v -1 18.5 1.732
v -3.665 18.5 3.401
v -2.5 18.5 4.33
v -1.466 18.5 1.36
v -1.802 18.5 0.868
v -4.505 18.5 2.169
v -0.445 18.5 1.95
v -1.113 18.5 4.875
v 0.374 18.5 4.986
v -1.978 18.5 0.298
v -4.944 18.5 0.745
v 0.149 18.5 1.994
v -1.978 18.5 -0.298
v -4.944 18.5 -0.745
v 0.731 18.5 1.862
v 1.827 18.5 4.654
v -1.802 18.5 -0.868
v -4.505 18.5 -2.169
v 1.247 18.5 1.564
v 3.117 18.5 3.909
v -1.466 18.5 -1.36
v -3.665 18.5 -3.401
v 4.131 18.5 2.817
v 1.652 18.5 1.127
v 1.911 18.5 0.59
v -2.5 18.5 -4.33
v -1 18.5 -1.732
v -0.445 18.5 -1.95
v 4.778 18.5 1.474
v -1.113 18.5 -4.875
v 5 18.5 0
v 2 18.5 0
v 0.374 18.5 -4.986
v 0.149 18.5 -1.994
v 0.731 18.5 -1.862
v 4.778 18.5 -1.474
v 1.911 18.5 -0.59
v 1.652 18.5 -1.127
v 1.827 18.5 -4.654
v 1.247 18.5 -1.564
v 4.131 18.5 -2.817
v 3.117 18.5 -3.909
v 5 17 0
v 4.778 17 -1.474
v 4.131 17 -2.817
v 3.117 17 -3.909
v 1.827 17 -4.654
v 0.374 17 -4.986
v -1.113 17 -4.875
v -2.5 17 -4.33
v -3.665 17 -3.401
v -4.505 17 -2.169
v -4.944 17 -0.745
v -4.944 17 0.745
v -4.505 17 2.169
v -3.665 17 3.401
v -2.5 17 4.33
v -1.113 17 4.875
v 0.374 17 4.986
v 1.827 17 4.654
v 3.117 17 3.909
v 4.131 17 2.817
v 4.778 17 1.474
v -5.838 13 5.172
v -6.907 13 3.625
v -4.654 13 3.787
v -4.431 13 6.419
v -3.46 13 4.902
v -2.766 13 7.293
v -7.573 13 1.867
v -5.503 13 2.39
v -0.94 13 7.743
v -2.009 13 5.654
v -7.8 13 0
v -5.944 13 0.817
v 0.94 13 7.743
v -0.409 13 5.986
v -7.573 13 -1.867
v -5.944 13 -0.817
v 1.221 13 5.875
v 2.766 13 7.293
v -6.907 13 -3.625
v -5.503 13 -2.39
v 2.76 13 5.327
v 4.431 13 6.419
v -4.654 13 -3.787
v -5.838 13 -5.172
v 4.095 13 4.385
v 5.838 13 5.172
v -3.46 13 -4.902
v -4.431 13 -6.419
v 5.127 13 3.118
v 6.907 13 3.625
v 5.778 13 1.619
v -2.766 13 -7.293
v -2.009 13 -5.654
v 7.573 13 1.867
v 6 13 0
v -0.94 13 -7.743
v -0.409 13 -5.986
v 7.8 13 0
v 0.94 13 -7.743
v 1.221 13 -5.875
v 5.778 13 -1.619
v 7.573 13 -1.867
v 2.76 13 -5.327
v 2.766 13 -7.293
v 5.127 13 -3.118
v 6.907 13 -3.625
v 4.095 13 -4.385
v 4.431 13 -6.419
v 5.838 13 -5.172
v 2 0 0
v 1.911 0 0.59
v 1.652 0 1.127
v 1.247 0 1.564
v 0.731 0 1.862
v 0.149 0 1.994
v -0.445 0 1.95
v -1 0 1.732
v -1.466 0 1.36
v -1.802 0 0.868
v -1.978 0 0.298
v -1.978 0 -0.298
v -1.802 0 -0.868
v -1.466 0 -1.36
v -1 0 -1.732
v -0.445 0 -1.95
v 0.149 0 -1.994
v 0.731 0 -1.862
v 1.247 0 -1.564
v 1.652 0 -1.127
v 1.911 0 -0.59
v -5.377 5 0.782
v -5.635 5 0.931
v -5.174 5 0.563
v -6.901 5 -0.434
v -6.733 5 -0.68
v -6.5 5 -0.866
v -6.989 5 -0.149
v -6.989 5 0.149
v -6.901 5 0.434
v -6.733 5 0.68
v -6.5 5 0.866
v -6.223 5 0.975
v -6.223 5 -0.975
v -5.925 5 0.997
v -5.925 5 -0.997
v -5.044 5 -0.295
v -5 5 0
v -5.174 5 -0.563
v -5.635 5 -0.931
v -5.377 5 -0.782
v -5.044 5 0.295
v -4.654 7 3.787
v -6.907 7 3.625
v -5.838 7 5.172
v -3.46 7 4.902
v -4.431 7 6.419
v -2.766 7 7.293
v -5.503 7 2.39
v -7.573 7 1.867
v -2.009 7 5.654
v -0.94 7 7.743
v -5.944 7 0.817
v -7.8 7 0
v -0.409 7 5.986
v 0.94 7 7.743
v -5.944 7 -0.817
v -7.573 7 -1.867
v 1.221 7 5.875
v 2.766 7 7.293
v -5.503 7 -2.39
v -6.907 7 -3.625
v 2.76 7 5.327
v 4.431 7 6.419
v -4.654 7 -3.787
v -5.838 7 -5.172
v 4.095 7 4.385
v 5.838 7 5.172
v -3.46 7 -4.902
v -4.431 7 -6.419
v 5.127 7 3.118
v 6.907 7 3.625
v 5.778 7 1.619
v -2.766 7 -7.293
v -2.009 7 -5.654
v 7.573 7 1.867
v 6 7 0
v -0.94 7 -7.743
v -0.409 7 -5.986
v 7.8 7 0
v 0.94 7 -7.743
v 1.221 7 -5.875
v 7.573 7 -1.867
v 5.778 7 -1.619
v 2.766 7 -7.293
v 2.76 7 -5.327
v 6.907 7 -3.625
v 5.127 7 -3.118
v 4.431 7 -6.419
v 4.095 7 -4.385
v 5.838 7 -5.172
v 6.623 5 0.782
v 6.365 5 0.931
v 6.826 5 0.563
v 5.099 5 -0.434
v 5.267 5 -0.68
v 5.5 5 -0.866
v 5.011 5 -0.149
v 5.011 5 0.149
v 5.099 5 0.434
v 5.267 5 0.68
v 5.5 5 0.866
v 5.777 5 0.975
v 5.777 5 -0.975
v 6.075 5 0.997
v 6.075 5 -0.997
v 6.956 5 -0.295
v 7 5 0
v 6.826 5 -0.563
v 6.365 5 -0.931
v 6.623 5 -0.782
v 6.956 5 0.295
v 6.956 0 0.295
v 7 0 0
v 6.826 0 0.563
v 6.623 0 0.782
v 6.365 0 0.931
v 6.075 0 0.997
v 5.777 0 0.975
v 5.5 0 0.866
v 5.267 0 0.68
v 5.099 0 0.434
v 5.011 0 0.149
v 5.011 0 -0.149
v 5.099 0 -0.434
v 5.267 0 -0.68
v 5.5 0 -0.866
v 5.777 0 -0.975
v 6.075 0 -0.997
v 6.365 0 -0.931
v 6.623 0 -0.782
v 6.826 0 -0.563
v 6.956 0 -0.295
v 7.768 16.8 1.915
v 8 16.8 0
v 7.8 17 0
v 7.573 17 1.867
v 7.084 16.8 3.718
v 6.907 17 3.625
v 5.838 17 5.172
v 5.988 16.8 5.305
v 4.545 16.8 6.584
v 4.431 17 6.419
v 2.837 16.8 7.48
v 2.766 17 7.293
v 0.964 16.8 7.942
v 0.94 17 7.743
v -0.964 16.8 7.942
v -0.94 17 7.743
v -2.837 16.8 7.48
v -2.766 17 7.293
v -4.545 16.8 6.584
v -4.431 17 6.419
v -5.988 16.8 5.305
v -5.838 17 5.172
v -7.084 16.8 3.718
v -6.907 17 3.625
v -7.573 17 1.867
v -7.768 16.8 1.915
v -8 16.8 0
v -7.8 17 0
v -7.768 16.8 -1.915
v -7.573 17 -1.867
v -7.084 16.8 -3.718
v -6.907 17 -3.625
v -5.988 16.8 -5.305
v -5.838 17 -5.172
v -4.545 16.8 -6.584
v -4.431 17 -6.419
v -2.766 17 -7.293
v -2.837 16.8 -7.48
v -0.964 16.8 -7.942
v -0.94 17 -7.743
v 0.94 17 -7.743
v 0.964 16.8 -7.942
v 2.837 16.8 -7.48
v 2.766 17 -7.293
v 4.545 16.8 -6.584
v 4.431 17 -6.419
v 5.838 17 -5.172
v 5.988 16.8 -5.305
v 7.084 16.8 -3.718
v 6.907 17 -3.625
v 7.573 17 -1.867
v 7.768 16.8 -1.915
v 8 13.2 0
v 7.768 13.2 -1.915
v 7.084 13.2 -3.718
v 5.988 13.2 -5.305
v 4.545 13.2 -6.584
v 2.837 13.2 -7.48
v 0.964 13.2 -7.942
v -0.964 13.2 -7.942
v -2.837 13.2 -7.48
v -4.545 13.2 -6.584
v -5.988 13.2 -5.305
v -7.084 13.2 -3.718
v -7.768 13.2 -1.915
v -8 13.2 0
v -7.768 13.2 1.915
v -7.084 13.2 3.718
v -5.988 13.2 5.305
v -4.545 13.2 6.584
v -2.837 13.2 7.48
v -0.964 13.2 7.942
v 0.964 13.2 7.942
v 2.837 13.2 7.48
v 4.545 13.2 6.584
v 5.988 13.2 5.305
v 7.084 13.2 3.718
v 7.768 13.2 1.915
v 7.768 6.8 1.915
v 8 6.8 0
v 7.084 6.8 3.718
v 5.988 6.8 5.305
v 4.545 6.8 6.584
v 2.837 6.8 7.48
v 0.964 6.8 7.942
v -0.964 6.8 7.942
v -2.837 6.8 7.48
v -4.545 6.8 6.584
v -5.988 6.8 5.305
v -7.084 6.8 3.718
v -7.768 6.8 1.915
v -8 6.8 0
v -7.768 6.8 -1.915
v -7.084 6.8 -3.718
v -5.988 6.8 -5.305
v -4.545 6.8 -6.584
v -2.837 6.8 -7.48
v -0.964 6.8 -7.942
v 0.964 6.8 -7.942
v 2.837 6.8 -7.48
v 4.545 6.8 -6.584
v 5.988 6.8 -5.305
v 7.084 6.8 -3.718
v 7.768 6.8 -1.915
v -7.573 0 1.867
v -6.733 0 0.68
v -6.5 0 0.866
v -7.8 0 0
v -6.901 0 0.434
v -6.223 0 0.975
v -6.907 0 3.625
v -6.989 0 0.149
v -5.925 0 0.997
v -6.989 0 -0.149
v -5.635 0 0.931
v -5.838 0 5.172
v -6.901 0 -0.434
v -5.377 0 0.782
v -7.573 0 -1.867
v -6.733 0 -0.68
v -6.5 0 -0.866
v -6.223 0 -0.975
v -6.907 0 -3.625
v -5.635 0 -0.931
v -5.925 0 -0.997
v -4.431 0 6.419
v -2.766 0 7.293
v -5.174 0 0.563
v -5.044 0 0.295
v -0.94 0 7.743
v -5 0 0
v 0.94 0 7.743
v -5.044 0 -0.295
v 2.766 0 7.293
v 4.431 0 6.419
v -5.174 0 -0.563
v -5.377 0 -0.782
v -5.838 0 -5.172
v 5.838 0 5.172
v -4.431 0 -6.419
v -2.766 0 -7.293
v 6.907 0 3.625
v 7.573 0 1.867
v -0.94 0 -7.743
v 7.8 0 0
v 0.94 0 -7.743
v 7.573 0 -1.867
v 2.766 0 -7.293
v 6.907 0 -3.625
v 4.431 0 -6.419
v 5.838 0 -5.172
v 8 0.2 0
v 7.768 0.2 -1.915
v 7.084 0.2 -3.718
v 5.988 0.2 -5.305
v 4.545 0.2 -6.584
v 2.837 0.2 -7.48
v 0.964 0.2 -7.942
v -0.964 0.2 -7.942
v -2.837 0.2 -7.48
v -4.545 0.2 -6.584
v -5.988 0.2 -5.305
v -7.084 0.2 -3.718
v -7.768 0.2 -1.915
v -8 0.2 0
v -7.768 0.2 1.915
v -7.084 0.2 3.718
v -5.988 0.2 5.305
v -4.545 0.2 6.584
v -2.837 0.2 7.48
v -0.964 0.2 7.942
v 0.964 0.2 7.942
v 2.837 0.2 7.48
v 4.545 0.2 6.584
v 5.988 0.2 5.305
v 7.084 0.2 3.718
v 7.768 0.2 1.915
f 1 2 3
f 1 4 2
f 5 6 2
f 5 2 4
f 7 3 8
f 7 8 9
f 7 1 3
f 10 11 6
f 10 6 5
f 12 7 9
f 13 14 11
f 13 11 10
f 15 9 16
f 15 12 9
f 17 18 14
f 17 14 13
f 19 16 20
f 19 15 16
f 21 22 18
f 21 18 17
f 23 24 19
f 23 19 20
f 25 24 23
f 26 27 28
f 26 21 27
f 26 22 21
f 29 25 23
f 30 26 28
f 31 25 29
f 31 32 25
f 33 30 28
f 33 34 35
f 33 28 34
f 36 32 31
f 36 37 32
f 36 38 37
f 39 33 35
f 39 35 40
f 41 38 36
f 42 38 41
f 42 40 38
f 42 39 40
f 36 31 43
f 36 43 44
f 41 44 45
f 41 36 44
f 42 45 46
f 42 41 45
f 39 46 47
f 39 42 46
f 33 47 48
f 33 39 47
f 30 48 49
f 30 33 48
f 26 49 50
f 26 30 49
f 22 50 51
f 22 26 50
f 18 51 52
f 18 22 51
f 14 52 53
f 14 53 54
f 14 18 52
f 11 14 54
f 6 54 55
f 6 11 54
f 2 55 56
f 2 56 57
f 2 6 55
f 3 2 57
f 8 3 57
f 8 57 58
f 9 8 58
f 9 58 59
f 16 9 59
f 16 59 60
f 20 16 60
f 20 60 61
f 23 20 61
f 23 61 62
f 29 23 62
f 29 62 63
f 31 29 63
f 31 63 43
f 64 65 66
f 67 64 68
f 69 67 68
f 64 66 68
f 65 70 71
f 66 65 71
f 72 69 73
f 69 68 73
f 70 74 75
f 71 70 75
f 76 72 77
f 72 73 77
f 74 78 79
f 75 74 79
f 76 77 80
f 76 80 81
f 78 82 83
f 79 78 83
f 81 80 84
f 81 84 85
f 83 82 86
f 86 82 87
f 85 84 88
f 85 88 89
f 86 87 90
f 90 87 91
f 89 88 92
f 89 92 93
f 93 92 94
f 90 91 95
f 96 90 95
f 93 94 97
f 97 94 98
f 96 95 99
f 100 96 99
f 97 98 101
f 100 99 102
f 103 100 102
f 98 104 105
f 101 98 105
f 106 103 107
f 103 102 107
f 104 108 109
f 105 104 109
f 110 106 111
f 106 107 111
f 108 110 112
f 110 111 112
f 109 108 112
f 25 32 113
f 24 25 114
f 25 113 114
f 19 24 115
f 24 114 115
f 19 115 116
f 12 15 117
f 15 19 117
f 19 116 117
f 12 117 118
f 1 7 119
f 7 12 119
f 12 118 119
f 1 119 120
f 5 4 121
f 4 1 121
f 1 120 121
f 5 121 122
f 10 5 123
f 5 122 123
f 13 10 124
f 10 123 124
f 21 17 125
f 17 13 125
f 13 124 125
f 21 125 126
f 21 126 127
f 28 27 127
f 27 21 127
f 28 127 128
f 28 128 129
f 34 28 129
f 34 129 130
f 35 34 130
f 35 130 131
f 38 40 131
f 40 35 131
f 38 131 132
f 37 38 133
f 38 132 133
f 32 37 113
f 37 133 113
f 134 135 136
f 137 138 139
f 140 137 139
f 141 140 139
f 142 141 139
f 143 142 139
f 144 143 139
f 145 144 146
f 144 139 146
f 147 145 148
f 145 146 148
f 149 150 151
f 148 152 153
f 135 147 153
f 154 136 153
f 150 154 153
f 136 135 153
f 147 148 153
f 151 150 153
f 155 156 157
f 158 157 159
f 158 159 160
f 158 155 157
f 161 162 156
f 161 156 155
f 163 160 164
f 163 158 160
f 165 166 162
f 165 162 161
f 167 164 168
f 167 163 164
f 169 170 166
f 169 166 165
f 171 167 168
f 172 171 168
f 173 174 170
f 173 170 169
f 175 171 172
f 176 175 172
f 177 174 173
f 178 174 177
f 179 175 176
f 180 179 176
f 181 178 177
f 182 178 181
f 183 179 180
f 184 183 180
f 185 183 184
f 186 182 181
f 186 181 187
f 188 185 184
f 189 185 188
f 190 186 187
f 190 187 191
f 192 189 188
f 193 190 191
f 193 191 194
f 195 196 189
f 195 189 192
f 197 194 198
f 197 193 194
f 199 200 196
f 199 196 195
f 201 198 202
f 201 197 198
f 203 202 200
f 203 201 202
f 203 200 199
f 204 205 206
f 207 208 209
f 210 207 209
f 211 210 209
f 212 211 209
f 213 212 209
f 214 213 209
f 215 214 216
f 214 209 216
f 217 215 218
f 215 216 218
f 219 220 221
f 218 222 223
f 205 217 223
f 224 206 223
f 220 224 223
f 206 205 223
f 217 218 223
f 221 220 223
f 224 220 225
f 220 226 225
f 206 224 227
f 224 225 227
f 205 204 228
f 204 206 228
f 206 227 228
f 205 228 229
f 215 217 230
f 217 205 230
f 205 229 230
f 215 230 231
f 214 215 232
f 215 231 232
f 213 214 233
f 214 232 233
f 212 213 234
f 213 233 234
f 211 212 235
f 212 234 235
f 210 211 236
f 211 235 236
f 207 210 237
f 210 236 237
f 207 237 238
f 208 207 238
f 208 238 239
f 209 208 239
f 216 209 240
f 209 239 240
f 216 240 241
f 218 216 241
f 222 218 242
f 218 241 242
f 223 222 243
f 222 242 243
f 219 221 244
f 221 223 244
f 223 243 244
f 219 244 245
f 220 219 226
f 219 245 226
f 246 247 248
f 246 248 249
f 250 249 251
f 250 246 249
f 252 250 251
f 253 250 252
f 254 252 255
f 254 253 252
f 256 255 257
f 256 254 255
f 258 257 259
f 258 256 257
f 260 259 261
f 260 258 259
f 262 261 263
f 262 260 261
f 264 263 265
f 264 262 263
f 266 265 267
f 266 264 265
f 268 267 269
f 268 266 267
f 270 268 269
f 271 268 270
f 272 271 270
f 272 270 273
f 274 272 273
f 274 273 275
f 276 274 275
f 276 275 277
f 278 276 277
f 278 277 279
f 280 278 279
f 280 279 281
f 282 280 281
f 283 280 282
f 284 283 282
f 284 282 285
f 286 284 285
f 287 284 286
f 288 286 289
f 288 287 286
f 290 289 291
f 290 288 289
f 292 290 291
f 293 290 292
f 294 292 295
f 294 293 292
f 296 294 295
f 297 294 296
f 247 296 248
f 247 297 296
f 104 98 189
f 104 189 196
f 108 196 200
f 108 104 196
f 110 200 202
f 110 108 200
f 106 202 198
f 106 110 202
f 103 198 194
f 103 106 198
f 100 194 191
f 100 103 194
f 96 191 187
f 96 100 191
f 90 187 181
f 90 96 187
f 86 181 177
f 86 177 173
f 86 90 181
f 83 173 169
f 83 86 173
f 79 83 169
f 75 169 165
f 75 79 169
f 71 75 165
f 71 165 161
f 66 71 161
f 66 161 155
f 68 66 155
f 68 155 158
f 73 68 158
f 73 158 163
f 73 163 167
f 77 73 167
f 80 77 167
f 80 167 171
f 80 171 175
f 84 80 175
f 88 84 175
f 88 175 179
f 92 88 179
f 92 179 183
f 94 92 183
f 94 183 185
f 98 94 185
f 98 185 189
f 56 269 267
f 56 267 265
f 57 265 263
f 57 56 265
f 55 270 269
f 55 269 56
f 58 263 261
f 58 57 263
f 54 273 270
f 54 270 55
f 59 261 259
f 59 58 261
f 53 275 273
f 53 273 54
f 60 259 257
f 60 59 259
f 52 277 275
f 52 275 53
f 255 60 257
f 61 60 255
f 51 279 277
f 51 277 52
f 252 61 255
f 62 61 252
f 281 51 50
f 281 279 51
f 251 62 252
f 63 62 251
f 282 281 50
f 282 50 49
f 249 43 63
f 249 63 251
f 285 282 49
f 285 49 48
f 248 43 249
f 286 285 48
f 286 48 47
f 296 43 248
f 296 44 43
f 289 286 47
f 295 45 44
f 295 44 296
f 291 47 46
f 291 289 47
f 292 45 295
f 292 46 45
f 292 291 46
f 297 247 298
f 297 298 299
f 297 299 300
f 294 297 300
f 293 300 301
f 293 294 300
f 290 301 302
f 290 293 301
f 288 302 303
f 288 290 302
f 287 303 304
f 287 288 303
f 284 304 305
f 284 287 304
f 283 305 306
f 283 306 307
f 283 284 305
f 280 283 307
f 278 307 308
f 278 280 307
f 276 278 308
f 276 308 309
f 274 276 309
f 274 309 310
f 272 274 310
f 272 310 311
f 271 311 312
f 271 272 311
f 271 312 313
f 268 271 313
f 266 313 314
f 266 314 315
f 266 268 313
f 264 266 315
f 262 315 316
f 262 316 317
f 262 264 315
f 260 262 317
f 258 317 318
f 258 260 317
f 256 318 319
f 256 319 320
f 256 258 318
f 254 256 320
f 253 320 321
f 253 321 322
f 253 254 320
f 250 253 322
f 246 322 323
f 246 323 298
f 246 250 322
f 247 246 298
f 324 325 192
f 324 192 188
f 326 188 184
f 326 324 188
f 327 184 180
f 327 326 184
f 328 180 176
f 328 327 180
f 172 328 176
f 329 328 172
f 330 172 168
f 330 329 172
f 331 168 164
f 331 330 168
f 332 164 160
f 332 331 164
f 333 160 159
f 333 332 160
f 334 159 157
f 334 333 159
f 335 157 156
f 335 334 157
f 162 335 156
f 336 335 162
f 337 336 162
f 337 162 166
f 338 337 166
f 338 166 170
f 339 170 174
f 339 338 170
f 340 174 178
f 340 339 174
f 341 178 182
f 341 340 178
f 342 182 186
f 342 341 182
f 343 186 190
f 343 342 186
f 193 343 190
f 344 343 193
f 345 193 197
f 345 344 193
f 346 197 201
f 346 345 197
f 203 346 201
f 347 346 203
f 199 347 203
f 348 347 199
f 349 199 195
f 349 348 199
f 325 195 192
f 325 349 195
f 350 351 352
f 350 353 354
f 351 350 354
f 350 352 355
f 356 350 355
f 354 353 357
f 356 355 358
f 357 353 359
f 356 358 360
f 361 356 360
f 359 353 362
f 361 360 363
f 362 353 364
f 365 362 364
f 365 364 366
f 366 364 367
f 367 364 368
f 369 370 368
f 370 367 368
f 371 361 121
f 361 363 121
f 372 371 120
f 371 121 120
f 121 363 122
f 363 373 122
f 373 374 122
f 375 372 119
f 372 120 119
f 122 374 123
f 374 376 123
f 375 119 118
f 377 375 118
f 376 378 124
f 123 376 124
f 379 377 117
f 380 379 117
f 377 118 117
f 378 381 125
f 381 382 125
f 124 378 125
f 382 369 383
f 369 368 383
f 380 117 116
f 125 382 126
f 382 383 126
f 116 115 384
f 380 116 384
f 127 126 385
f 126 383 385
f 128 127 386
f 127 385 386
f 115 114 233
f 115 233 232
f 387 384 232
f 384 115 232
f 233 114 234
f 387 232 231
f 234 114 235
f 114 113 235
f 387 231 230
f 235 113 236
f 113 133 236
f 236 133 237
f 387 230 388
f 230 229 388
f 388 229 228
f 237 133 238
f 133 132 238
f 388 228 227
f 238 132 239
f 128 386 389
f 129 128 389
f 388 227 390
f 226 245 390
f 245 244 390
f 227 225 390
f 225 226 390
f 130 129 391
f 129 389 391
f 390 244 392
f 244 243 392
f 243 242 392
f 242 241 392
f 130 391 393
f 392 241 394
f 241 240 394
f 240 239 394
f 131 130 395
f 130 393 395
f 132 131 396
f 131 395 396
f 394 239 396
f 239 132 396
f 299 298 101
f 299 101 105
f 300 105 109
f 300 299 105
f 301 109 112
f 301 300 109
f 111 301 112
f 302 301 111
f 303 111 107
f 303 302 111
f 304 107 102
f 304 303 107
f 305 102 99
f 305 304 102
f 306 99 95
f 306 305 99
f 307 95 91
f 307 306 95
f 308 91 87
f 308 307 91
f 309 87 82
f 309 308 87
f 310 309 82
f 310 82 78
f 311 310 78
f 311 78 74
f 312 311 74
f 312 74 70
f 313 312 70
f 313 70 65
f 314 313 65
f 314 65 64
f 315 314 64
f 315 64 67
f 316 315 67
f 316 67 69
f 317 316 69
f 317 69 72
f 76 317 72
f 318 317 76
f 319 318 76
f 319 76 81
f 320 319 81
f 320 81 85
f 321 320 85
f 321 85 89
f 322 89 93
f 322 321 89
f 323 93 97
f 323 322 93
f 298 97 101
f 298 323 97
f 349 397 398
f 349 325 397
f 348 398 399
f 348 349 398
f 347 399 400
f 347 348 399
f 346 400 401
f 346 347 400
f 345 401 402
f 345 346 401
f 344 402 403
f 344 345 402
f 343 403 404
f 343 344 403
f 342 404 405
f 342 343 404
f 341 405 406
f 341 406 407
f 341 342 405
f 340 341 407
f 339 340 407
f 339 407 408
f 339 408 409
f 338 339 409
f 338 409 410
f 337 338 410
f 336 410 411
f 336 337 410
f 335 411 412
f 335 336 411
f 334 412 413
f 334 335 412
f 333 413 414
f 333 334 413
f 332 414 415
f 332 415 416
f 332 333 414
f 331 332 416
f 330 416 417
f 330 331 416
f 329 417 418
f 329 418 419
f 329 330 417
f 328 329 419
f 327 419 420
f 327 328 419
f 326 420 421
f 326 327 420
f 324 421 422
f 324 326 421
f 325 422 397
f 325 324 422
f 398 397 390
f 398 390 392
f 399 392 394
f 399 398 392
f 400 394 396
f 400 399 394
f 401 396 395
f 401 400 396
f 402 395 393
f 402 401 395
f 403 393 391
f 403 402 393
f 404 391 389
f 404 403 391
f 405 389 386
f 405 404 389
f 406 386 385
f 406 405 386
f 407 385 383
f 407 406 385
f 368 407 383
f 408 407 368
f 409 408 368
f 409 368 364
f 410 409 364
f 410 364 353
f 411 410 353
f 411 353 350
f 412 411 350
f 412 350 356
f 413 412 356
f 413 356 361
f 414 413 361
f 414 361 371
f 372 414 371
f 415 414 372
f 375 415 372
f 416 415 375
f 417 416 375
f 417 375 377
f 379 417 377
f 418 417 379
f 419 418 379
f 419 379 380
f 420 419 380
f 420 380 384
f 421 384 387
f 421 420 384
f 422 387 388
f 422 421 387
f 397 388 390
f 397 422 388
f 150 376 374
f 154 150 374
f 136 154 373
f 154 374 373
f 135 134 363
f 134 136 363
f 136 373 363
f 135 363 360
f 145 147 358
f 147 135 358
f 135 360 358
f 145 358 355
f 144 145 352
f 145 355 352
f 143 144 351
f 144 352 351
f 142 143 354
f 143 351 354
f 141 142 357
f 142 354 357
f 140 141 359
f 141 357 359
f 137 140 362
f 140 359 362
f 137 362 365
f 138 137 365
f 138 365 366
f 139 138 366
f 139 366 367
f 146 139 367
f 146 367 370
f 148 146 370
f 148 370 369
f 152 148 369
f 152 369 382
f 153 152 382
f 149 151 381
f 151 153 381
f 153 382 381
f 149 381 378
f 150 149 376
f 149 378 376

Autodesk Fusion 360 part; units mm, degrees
sketch "Sketch1" plane through (0, 0, 0) normal (0, 0, 1) x (1, 0, 0)
  line L0 (0, 0) -> (0, 70.4213)
  line L1 (0, 0) -> (8, 0)
  line L2 (8, 0) -> (8, 7)
  line L3 (8, 7) -> (6, 7)
  line L4 (6, 7) -> (6, 13)
  line L5 (6, 13) -> (8, 13)
  line L6 (8, 13) -> (8, 17)
  line L7 (8, 17) -> (0, 17)
  line L8 (2, 18.5) -> (2, 0)
  line L9 (5, 17) -> (5, 18.5)
  line L10 (5, 18.5) -> (0, 18.5)
  dimension "d1" = 17
  dimension "d2" = 4
  dimension "d3" = 7
  dimension "d4" = 12
  dimension "d5" = 16
  dimension "d6" = 1.5
  dimension "d7" = 10
  dimension "d8" = 4
revolve "Revolve1" add sketch "Sketch1" angle 360 about axis through (0, 0, 0) along (0, 1, 0) contours L1 L2 L3 L4 L5 L6 L7 L8 | L7 L8 L9 L10
sketch "Sketch2" plane through (0, 0, 0) normal (0, 1, 0) x (1, 0, 0)
  line L0 (0, 0) -> (6, 0) construction
  line L1 (0, 0) -> (-6, 0) construction
  circle A0 centre (-6, 0) radius 1
  circle A1 centre (6, 0) radius 1
  dimension "d10" = 2
  dimension "d11" = 6
extrude "Extrude1" cut sketch "Sketch2" along normal blind 5
chamfer "Chamfer1" distance 0.2 angle 45 4 edges at (-7.4586, 17, -2.8929) (-7.4586, 7, -2.8929) (-7.4586, 13, -2.8929) (-7.4586, 0, -2.8929)
